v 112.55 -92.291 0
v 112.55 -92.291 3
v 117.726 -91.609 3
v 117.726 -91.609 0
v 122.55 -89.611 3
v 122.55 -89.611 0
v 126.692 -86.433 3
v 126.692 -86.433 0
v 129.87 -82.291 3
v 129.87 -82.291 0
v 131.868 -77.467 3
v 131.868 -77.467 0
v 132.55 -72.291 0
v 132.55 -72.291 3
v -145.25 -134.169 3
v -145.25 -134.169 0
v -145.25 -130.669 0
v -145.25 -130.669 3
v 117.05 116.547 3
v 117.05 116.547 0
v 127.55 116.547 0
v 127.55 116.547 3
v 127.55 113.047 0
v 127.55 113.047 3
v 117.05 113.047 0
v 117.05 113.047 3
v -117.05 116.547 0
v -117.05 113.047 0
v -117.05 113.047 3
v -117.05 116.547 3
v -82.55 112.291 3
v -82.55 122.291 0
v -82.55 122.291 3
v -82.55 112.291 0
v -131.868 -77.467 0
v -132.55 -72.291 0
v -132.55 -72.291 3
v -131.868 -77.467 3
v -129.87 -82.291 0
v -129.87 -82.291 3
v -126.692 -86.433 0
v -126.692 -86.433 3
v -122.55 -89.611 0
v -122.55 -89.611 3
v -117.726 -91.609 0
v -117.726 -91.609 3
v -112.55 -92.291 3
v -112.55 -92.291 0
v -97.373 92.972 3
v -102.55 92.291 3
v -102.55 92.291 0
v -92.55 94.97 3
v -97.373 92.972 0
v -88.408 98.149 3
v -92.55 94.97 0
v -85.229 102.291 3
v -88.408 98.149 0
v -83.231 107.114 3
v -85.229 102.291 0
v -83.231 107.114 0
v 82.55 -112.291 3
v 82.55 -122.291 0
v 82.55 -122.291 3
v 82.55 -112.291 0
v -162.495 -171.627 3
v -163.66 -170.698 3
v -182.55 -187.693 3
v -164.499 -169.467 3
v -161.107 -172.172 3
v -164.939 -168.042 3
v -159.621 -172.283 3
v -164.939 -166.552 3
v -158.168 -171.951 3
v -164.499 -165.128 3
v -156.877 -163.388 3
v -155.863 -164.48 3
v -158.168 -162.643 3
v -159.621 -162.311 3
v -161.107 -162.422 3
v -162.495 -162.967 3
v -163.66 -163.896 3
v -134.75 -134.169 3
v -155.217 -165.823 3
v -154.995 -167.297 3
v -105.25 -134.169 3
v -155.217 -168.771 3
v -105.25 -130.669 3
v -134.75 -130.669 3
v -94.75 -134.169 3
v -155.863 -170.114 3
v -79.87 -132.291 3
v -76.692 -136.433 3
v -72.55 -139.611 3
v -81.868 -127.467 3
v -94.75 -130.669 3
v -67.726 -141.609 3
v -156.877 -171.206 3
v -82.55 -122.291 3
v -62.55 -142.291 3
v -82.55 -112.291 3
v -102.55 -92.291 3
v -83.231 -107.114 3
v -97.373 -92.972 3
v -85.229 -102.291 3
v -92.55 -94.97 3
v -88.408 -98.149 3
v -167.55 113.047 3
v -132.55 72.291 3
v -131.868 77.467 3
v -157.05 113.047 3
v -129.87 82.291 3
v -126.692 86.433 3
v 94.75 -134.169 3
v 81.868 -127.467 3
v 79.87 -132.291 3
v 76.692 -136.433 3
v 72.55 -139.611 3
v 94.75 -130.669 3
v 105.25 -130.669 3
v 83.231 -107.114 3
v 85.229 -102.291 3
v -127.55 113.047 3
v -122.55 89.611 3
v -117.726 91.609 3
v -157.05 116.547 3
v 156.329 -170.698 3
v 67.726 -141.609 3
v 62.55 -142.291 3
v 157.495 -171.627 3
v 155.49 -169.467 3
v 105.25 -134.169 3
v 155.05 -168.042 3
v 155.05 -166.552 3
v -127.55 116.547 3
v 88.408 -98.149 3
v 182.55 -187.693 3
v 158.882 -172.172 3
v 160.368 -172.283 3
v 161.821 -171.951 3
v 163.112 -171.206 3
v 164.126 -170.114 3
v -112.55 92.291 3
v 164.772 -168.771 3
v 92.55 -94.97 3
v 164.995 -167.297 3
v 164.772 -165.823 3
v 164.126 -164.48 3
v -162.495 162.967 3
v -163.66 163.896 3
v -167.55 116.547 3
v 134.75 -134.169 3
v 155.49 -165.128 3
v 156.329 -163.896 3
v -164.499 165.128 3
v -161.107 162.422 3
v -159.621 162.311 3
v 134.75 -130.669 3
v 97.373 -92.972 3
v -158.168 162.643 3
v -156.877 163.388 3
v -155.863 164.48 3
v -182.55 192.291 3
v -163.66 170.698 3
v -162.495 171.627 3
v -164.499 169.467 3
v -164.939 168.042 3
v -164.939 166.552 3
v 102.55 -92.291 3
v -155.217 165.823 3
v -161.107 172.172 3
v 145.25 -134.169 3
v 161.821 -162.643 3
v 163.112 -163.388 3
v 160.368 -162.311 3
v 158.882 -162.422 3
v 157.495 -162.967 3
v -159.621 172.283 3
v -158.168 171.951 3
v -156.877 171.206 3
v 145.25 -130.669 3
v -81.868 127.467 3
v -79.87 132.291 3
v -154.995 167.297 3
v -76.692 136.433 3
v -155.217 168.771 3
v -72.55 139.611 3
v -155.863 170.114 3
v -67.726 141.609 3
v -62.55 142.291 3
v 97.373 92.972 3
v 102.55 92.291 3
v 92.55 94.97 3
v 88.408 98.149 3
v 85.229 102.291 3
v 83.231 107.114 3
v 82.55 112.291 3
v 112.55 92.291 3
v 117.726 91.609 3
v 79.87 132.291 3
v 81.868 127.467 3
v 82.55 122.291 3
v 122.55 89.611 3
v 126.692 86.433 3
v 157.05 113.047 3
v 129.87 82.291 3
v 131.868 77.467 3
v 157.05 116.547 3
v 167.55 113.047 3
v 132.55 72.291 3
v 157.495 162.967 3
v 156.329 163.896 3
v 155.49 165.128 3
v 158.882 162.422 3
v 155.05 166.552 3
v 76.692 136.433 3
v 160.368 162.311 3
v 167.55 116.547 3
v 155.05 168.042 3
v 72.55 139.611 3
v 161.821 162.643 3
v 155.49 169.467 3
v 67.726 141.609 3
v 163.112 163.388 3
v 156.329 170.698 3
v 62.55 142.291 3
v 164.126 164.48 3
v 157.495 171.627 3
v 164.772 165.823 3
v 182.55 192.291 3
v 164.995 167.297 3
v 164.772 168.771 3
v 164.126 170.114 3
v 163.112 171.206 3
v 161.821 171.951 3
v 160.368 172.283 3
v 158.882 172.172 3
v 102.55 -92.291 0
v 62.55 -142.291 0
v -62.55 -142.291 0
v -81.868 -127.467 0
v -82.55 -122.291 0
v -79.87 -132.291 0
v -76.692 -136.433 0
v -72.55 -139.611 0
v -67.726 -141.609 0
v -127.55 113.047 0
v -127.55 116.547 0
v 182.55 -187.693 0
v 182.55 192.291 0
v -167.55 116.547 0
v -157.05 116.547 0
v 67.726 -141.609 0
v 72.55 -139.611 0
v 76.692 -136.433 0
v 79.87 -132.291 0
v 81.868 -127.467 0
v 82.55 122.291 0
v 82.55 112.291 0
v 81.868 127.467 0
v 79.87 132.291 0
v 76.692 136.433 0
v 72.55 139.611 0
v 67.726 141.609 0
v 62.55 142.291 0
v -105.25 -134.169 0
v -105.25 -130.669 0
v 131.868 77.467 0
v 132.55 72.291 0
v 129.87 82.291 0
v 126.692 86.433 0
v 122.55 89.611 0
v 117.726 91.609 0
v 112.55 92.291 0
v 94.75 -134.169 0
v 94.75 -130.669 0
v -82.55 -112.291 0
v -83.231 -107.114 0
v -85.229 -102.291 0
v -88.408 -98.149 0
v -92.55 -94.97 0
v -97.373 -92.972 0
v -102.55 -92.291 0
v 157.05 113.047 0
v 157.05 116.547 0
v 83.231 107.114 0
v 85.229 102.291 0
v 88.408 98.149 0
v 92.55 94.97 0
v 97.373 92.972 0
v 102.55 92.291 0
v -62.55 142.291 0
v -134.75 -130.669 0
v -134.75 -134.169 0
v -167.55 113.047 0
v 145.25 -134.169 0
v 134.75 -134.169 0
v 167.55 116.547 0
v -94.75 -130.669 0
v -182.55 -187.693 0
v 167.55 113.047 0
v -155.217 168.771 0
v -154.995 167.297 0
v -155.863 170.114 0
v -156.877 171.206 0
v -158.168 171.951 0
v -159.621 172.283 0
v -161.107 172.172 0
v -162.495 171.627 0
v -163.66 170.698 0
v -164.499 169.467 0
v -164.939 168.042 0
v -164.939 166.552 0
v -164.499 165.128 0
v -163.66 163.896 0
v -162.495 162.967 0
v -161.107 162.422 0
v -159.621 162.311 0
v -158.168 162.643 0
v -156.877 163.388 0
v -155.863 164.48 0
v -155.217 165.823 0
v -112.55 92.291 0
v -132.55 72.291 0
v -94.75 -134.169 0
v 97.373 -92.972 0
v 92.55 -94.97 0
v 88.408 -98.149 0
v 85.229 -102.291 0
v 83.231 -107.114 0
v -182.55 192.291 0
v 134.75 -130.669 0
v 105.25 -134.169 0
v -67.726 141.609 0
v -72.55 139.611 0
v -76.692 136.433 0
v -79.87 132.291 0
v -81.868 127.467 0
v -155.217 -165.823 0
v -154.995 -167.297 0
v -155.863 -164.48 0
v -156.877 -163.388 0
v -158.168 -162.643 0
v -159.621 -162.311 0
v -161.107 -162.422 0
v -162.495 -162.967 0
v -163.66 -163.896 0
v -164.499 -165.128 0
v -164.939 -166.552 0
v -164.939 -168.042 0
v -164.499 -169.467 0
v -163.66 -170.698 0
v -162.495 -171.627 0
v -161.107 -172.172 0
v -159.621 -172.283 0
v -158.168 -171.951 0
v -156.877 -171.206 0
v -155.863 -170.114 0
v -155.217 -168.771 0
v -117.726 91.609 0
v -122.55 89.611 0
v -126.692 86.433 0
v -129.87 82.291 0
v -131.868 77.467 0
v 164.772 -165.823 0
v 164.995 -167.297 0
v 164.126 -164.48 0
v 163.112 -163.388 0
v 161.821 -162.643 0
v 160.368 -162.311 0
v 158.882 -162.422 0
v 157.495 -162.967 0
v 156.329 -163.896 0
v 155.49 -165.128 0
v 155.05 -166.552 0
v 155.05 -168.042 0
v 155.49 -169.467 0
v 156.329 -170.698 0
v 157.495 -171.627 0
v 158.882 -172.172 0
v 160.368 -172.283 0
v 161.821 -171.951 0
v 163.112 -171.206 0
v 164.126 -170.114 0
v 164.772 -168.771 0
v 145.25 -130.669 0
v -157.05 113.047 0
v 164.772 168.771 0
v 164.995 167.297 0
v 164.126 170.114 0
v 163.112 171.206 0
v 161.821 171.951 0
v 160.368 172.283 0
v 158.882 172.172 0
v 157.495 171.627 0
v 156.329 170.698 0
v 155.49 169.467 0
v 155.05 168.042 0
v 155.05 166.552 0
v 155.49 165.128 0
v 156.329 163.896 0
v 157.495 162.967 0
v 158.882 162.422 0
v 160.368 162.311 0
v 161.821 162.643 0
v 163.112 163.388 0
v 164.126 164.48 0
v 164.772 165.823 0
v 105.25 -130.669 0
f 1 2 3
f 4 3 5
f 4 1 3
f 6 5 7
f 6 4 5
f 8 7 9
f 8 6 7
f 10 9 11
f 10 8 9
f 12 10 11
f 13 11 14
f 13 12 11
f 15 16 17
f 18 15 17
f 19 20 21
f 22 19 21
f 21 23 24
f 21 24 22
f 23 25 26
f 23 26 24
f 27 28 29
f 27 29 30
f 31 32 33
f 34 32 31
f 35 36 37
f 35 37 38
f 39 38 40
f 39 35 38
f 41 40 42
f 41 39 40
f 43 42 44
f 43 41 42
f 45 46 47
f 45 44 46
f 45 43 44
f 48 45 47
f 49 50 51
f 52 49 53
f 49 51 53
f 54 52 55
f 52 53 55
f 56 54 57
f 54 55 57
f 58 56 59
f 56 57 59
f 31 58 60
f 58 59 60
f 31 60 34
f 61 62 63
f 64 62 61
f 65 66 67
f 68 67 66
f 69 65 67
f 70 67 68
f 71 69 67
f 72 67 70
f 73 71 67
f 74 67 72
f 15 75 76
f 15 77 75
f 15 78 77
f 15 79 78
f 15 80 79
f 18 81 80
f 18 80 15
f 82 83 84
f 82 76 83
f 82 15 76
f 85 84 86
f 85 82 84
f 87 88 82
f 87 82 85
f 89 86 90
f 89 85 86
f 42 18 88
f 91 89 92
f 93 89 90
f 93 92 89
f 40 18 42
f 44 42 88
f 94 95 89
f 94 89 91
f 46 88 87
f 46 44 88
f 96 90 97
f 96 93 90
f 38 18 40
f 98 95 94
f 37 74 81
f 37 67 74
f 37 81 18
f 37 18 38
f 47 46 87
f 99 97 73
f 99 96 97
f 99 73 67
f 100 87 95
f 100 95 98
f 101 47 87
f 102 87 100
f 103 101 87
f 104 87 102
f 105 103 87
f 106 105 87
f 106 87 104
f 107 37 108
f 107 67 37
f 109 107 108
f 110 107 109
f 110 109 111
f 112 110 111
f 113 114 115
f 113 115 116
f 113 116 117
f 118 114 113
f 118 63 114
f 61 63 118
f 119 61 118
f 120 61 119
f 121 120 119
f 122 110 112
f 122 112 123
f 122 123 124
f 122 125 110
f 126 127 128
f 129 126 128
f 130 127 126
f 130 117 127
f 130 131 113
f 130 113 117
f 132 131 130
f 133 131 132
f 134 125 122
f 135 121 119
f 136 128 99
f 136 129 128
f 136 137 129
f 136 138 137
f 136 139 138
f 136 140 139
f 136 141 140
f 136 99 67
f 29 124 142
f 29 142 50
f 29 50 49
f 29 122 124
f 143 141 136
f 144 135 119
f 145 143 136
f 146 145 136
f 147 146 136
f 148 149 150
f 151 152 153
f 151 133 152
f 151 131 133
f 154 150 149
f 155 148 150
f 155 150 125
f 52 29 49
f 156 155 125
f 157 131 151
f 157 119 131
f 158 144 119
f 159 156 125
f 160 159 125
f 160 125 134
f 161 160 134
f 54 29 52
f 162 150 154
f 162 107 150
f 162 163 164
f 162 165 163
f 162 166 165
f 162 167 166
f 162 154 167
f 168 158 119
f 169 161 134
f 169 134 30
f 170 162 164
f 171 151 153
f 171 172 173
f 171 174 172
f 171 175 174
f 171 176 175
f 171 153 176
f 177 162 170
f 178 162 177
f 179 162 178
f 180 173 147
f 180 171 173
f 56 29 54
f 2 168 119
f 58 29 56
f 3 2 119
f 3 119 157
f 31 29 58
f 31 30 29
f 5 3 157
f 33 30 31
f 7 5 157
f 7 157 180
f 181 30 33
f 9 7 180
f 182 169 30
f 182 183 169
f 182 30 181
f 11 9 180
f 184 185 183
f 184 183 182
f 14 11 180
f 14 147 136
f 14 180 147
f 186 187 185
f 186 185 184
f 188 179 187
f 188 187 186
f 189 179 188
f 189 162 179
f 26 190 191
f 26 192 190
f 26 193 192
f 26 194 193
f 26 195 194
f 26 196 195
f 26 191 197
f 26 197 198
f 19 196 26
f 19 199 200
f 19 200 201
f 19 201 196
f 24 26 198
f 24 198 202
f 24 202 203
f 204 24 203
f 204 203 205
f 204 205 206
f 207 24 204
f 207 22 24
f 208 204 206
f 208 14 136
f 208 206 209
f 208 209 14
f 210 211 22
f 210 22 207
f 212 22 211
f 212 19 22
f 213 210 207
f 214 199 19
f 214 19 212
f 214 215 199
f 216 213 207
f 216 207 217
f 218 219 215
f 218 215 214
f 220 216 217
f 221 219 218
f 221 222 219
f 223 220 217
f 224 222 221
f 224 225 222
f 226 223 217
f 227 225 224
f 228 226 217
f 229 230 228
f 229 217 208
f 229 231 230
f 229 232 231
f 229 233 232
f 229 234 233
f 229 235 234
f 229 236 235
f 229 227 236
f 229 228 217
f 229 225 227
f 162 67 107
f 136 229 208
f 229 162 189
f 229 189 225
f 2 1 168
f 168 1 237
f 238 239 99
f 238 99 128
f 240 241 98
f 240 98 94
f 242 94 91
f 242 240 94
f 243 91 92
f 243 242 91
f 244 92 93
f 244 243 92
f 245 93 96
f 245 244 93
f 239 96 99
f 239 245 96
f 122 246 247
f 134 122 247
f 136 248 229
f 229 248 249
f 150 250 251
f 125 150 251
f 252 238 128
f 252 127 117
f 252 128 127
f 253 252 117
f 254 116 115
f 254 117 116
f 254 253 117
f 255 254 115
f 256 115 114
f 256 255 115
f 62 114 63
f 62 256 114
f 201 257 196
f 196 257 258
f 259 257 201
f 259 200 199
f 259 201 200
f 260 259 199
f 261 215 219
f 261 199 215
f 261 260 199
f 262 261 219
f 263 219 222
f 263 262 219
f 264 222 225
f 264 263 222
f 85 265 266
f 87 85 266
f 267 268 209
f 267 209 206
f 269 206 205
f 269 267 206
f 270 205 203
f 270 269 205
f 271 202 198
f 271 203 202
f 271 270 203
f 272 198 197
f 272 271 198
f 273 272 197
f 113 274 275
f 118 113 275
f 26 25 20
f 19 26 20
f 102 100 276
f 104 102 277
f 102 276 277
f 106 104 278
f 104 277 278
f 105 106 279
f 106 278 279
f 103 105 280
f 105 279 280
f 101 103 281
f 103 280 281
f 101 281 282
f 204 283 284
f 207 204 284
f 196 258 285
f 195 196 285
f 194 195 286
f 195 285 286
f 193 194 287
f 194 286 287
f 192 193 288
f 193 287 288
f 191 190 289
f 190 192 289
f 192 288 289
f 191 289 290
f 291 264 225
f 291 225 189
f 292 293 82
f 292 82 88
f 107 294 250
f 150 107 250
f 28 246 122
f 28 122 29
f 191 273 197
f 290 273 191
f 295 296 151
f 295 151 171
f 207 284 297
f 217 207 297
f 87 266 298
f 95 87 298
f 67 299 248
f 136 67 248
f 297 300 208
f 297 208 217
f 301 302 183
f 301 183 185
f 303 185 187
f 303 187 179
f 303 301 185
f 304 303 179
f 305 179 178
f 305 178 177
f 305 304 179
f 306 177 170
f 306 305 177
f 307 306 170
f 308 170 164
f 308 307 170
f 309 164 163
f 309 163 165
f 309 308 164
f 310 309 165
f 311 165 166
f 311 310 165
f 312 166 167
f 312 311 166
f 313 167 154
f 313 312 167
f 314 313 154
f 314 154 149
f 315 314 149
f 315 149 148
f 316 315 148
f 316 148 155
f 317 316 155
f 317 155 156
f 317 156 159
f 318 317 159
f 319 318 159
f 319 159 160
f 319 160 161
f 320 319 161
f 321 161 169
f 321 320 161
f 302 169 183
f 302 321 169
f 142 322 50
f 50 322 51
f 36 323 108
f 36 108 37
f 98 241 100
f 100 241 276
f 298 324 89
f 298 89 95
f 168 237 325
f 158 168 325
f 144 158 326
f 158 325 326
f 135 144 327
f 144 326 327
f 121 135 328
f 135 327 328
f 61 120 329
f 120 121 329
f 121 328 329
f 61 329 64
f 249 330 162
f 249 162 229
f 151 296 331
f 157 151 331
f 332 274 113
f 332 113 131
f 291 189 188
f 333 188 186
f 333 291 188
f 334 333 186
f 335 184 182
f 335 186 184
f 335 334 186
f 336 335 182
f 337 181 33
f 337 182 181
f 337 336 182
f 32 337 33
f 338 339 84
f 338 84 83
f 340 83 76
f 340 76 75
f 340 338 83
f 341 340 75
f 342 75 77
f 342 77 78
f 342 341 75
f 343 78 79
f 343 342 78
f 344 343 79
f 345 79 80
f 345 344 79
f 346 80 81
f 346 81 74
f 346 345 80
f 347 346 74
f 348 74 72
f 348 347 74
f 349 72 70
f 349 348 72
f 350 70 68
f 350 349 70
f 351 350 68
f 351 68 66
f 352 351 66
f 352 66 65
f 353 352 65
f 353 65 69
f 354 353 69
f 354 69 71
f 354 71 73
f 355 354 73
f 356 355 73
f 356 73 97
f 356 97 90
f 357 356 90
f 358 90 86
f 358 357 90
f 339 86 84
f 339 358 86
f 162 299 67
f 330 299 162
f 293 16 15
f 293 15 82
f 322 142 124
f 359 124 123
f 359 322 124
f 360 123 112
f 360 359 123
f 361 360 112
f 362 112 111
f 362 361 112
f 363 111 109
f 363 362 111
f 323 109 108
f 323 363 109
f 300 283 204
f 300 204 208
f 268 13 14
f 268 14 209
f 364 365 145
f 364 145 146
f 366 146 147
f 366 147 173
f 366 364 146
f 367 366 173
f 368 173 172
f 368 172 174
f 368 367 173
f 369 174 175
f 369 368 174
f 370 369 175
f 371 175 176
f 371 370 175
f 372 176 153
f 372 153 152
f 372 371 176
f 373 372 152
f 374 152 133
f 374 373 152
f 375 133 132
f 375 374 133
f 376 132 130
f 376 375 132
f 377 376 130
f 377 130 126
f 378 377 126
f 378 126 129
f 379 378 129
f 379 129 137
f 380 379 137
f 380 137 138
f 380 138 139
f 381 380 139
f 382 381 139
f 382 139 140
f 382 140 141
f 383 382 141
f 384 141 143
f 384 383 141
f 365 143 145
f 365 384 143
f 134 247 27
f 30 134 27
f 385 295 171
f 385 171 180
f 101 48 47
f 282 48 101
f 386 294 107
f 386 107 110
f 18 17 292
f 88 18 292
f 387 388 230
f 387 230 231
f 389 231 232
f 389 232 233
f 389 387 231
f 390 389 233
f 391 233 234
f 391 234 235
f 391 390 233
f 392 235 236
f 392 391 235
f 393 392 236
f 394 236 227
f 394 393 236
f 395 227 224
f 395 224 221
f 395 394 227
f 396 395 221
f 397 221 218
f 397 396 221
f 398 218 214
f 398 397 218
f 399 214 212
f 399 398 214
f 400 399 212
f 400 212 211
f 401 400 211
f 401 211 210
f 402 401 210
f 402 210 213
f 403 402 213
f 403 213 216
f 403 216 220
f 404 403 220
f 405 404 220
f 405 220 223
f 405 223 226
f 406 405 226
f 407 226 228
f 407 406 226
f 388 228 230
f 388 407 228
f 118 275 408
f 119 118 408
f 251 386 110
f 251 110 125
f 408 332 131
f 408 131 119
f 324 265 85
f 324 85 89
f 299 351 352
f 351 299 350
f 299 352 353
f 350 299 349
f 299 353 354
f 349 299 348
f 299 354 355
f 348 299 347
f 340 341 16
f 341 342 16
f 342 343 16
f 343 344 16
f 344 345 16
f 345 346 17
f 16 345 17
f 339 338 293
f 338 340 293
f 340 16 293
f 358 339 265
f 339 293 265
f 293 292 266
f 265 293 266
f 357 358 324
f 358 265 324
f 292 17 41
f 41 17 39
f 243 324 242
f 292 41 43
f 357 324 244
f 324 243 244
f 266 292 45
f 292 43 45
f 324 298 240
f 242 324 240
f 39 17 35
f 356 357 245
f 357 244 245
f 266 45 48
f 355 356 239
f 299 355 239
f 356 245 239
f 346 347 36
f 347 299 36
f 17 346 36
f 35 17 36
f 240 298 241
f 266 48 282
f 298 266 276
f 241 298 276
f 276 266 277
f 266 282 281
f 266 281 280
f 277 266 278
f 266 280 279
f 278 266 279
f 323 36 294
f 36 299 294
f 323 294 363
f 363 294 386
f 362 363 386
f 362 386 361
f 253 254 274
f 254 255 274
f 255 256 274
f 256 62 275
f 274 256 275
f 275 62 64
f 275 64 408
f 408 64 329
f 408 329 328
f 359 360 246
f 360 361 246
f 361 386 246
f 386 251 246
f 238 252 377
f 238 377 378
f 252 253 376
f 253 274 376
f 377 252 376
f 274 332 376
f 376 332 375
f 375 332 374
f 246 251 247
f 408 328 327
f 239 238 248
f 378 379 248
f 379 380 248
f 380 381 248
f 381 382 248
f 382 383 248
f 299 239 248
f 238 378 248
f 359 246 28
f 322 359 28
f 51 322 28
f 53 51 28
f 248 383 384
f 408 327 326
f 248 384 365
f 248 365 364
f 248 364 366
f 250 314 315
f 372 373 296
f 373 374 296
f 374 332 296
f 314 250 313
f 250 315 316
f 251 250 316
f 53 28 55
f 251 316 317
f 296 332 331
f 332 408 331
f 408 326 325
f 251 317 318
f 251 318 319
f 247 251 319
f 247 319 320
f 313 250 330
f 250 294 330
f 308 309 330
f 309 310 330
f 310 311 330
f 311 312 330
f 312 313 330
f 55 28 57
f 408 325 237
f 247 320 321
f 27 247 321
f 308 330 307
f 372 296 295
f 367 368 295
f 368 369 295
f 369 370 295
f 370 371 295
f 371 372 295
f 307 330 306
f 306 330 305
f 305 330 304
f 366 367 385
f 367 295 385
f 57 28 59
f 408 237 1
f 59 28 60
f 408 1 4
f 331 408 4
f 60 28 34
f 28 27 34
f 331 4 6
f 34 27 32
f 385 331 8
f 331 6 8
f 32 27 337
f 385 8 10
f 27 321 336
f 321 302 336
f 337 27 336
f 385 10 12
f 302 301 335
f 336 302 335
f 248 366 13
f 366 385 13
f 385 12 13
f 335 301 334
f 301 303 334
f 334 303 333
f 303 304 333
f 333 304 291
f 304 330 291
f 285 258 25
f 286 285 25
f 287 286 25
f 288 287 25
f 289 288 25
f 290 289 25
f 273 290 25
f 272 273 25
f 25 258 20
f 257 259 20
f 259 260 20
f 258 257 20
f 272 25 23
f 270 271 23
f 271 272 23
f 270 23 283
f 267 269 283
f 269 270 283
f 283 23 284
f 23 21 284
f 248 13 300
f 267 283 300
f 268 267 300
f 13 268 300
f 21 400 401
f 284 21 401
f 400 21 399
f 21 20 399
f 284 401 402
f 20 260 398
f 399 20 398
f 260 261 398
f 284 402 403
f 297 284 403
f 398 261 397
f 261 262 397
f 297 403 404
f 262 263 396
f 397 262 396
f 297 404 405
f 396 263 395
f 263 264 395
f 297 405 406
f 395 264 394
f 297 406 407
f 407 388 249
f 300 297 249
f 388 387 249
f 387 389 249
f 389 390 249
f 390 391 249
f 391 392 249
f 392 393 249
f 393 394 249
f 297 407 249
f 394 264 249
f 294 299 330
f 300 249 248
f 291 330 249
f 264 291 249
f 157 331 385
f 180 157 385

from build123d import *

# Parameters (mm, degrees)
SKETCH_W          = 365.0996
SKETCH_H          = 379.984
SKETCH_R          = 5
SKETCH_W_2        = 10.5
SKETCH_H_2        = 3.5
PAD_DEPTH         = 3
POCKET_DEPTH      = 0.001
POCKET_DEPTH_BACK = -3.001


with BuildPart() as part:
    # Sketch → Pad (new body)
    with BuildSketch(Plane.XY):
        with Locations((0, 2.2987)):
            Rectangle(SKETCH_W, SKETCH_H)
        with Locations((-159.9946, 167.2971)):
            Circle(SKETCH_R, mode=Mode.SUBTRACT)
        with Locations((159.9946, 167.2971)):
            Circle(SKETCH_R, mode=Mode.SUBTRACT)
        with Locations((159.9946, -167.2971)):
            Circle(SKETCH_R, mode=Mode.SUBTRACT)
        with Locations((-159.9946, -167.2971)):
            Circle(SKETCH_R, mode=Mode.SUBTRACT)
        with Locations((-140, -132.419)):
            Rectangle(SKETCH_W_2, SKETCH_H_2, mode=Mode.SUBTRACT)
        with Locations((-100, -132.419)):
            Rectangle(SKETCH_W_2, SKETCH_H_2, mode=Mode.SUBTRACT)
        with Locations((100, -132.419)):
            Rectangle(SKETCH_W_2, SKETCH_H_2, mode=Mode.SUBTRACT)
        with Locations((140, -132.419)):
            Rectangle(SKETCH_W_2, SKETCH_H_2, mode=Mode.SUBTRACT)
        with Locations((-162.2998, 114.7971)):
            Rectangle(SKETCH_W_2, SKETCH_H_2, mode=Mode.SUBTRACT)
        with Locations((-122.2998, 114.7971)):
            Rectangle(SKETCH_W_2, SKETCH_H_2, mode=Mode.SUBTRACT)
        with Locations((122.2998, 114.7971)):
            Rectangle(SKETCH_W_2, SKETCH_H_2, mode=Mode.SUBTRACT)
        with Locations((162.2998, 114.7971)):
            Rectangle(SKETCH_W_2, SKETCH_H_2, mode=Mode.SUBTRACT)
    extrude(amount=PAD_DEPTH)

    # Sketch001 → Pocket (cut, two sides)
    with BuildSketch(Plane.XY) as pocket_sk:
        with BuildLine():
            Line((0, 142.2907), (-62.5498, 142.2907))
            ThreePointArc((-62.5498, 142.2907), (-76.691936, 136.432836), (-82.5498, 122.2907))
            Line((-82.5498, 122.2907), (-82.5498, 112.2907))
            ThreePointArc((-102.5498, 92.2907), (-88.407664, 98.148564), (-82.5498, 112.2907))
            Line((-112.5498, 92.2907), (-102.5498, 92.2907))
            ThreePointArc((-112.5498, 92.2907), (-126.691936, 86.432836), (-132.5498, 72.2907))
            Line((-132.5498, 0), (-132.5498, 72.2907))
            Line((-132.5498, 0), (-132.5498, -72.2907))
            ThreePointArc((-132.5498, -72.2907), (-126.691936, -86.432836), (-112.5498, -92.2907))
            Line((-112.5498, -92.2907), (-102.5498, -92.2907))
            ThreePointArc((-82.5498, -112.2907), (-88.407664, -98.148564), (-102.5498, -92.2907))
            Line((-82.5498, -122.2907), (-82.5498, -112.2907))
            ThreePointArc((-82.5498, -122.2907), (-76.691936, -136.432836), (-62.5498, -142.2907))
            Line((0, -142.2907), (-62.5498, -142.2907))
            Line((0, -142.2907), (62.5498, -142.2907))
            ThreePointArc((62.5498, -142.2907), (76.691935, -136.432835), (82.549799, -122.2907))
            Line((82.549799, -122.2907), (82.549799, -112.2907))
            ThreePointArc((102.5498, -92.290701), (88.407664, -98.148564), (82.549799, -112.2907))
            Line((112.5498, -92.290701), (102.5498, -92.290701))
            ThreePointArc((112.5498, -92.290701), (126.691936, -86.432836), (132.5498, -72.2907))
            Line((132.5498, 0), (132.5498, -72.2907))
            Line((132.5498, 0), (132.5498, 72.2907))
            ThreePointArc((132.5498, 72.2907), (126.691936, 86.432836), (112.5498, 92.290701))
            Line((112.5498, 92.290701), (102.5498, 92.290701))
            ThreePointArc((82.549799, 112.2907), (88.407664, 98.148564), (102.5498, 92.290701))
            Line((82.549799, 122.2907), (82.549799, 112.2907))
            ThreePointArc((82.549799, 122.2907), (76.691935, 136.432835), (62.5498, 142.2907))
            Line((0, 142.2907), (62.5498, 142.2907))
        make_face()
    extrude(amount=-POCKET_DEPTH, mode=Mode.SUBTRACT)
    extrude(pocket_sk.sketch, amount=-POCKET_DEPTH_BACK, mode=Mode.SUBTRACT)


solid = part.part
